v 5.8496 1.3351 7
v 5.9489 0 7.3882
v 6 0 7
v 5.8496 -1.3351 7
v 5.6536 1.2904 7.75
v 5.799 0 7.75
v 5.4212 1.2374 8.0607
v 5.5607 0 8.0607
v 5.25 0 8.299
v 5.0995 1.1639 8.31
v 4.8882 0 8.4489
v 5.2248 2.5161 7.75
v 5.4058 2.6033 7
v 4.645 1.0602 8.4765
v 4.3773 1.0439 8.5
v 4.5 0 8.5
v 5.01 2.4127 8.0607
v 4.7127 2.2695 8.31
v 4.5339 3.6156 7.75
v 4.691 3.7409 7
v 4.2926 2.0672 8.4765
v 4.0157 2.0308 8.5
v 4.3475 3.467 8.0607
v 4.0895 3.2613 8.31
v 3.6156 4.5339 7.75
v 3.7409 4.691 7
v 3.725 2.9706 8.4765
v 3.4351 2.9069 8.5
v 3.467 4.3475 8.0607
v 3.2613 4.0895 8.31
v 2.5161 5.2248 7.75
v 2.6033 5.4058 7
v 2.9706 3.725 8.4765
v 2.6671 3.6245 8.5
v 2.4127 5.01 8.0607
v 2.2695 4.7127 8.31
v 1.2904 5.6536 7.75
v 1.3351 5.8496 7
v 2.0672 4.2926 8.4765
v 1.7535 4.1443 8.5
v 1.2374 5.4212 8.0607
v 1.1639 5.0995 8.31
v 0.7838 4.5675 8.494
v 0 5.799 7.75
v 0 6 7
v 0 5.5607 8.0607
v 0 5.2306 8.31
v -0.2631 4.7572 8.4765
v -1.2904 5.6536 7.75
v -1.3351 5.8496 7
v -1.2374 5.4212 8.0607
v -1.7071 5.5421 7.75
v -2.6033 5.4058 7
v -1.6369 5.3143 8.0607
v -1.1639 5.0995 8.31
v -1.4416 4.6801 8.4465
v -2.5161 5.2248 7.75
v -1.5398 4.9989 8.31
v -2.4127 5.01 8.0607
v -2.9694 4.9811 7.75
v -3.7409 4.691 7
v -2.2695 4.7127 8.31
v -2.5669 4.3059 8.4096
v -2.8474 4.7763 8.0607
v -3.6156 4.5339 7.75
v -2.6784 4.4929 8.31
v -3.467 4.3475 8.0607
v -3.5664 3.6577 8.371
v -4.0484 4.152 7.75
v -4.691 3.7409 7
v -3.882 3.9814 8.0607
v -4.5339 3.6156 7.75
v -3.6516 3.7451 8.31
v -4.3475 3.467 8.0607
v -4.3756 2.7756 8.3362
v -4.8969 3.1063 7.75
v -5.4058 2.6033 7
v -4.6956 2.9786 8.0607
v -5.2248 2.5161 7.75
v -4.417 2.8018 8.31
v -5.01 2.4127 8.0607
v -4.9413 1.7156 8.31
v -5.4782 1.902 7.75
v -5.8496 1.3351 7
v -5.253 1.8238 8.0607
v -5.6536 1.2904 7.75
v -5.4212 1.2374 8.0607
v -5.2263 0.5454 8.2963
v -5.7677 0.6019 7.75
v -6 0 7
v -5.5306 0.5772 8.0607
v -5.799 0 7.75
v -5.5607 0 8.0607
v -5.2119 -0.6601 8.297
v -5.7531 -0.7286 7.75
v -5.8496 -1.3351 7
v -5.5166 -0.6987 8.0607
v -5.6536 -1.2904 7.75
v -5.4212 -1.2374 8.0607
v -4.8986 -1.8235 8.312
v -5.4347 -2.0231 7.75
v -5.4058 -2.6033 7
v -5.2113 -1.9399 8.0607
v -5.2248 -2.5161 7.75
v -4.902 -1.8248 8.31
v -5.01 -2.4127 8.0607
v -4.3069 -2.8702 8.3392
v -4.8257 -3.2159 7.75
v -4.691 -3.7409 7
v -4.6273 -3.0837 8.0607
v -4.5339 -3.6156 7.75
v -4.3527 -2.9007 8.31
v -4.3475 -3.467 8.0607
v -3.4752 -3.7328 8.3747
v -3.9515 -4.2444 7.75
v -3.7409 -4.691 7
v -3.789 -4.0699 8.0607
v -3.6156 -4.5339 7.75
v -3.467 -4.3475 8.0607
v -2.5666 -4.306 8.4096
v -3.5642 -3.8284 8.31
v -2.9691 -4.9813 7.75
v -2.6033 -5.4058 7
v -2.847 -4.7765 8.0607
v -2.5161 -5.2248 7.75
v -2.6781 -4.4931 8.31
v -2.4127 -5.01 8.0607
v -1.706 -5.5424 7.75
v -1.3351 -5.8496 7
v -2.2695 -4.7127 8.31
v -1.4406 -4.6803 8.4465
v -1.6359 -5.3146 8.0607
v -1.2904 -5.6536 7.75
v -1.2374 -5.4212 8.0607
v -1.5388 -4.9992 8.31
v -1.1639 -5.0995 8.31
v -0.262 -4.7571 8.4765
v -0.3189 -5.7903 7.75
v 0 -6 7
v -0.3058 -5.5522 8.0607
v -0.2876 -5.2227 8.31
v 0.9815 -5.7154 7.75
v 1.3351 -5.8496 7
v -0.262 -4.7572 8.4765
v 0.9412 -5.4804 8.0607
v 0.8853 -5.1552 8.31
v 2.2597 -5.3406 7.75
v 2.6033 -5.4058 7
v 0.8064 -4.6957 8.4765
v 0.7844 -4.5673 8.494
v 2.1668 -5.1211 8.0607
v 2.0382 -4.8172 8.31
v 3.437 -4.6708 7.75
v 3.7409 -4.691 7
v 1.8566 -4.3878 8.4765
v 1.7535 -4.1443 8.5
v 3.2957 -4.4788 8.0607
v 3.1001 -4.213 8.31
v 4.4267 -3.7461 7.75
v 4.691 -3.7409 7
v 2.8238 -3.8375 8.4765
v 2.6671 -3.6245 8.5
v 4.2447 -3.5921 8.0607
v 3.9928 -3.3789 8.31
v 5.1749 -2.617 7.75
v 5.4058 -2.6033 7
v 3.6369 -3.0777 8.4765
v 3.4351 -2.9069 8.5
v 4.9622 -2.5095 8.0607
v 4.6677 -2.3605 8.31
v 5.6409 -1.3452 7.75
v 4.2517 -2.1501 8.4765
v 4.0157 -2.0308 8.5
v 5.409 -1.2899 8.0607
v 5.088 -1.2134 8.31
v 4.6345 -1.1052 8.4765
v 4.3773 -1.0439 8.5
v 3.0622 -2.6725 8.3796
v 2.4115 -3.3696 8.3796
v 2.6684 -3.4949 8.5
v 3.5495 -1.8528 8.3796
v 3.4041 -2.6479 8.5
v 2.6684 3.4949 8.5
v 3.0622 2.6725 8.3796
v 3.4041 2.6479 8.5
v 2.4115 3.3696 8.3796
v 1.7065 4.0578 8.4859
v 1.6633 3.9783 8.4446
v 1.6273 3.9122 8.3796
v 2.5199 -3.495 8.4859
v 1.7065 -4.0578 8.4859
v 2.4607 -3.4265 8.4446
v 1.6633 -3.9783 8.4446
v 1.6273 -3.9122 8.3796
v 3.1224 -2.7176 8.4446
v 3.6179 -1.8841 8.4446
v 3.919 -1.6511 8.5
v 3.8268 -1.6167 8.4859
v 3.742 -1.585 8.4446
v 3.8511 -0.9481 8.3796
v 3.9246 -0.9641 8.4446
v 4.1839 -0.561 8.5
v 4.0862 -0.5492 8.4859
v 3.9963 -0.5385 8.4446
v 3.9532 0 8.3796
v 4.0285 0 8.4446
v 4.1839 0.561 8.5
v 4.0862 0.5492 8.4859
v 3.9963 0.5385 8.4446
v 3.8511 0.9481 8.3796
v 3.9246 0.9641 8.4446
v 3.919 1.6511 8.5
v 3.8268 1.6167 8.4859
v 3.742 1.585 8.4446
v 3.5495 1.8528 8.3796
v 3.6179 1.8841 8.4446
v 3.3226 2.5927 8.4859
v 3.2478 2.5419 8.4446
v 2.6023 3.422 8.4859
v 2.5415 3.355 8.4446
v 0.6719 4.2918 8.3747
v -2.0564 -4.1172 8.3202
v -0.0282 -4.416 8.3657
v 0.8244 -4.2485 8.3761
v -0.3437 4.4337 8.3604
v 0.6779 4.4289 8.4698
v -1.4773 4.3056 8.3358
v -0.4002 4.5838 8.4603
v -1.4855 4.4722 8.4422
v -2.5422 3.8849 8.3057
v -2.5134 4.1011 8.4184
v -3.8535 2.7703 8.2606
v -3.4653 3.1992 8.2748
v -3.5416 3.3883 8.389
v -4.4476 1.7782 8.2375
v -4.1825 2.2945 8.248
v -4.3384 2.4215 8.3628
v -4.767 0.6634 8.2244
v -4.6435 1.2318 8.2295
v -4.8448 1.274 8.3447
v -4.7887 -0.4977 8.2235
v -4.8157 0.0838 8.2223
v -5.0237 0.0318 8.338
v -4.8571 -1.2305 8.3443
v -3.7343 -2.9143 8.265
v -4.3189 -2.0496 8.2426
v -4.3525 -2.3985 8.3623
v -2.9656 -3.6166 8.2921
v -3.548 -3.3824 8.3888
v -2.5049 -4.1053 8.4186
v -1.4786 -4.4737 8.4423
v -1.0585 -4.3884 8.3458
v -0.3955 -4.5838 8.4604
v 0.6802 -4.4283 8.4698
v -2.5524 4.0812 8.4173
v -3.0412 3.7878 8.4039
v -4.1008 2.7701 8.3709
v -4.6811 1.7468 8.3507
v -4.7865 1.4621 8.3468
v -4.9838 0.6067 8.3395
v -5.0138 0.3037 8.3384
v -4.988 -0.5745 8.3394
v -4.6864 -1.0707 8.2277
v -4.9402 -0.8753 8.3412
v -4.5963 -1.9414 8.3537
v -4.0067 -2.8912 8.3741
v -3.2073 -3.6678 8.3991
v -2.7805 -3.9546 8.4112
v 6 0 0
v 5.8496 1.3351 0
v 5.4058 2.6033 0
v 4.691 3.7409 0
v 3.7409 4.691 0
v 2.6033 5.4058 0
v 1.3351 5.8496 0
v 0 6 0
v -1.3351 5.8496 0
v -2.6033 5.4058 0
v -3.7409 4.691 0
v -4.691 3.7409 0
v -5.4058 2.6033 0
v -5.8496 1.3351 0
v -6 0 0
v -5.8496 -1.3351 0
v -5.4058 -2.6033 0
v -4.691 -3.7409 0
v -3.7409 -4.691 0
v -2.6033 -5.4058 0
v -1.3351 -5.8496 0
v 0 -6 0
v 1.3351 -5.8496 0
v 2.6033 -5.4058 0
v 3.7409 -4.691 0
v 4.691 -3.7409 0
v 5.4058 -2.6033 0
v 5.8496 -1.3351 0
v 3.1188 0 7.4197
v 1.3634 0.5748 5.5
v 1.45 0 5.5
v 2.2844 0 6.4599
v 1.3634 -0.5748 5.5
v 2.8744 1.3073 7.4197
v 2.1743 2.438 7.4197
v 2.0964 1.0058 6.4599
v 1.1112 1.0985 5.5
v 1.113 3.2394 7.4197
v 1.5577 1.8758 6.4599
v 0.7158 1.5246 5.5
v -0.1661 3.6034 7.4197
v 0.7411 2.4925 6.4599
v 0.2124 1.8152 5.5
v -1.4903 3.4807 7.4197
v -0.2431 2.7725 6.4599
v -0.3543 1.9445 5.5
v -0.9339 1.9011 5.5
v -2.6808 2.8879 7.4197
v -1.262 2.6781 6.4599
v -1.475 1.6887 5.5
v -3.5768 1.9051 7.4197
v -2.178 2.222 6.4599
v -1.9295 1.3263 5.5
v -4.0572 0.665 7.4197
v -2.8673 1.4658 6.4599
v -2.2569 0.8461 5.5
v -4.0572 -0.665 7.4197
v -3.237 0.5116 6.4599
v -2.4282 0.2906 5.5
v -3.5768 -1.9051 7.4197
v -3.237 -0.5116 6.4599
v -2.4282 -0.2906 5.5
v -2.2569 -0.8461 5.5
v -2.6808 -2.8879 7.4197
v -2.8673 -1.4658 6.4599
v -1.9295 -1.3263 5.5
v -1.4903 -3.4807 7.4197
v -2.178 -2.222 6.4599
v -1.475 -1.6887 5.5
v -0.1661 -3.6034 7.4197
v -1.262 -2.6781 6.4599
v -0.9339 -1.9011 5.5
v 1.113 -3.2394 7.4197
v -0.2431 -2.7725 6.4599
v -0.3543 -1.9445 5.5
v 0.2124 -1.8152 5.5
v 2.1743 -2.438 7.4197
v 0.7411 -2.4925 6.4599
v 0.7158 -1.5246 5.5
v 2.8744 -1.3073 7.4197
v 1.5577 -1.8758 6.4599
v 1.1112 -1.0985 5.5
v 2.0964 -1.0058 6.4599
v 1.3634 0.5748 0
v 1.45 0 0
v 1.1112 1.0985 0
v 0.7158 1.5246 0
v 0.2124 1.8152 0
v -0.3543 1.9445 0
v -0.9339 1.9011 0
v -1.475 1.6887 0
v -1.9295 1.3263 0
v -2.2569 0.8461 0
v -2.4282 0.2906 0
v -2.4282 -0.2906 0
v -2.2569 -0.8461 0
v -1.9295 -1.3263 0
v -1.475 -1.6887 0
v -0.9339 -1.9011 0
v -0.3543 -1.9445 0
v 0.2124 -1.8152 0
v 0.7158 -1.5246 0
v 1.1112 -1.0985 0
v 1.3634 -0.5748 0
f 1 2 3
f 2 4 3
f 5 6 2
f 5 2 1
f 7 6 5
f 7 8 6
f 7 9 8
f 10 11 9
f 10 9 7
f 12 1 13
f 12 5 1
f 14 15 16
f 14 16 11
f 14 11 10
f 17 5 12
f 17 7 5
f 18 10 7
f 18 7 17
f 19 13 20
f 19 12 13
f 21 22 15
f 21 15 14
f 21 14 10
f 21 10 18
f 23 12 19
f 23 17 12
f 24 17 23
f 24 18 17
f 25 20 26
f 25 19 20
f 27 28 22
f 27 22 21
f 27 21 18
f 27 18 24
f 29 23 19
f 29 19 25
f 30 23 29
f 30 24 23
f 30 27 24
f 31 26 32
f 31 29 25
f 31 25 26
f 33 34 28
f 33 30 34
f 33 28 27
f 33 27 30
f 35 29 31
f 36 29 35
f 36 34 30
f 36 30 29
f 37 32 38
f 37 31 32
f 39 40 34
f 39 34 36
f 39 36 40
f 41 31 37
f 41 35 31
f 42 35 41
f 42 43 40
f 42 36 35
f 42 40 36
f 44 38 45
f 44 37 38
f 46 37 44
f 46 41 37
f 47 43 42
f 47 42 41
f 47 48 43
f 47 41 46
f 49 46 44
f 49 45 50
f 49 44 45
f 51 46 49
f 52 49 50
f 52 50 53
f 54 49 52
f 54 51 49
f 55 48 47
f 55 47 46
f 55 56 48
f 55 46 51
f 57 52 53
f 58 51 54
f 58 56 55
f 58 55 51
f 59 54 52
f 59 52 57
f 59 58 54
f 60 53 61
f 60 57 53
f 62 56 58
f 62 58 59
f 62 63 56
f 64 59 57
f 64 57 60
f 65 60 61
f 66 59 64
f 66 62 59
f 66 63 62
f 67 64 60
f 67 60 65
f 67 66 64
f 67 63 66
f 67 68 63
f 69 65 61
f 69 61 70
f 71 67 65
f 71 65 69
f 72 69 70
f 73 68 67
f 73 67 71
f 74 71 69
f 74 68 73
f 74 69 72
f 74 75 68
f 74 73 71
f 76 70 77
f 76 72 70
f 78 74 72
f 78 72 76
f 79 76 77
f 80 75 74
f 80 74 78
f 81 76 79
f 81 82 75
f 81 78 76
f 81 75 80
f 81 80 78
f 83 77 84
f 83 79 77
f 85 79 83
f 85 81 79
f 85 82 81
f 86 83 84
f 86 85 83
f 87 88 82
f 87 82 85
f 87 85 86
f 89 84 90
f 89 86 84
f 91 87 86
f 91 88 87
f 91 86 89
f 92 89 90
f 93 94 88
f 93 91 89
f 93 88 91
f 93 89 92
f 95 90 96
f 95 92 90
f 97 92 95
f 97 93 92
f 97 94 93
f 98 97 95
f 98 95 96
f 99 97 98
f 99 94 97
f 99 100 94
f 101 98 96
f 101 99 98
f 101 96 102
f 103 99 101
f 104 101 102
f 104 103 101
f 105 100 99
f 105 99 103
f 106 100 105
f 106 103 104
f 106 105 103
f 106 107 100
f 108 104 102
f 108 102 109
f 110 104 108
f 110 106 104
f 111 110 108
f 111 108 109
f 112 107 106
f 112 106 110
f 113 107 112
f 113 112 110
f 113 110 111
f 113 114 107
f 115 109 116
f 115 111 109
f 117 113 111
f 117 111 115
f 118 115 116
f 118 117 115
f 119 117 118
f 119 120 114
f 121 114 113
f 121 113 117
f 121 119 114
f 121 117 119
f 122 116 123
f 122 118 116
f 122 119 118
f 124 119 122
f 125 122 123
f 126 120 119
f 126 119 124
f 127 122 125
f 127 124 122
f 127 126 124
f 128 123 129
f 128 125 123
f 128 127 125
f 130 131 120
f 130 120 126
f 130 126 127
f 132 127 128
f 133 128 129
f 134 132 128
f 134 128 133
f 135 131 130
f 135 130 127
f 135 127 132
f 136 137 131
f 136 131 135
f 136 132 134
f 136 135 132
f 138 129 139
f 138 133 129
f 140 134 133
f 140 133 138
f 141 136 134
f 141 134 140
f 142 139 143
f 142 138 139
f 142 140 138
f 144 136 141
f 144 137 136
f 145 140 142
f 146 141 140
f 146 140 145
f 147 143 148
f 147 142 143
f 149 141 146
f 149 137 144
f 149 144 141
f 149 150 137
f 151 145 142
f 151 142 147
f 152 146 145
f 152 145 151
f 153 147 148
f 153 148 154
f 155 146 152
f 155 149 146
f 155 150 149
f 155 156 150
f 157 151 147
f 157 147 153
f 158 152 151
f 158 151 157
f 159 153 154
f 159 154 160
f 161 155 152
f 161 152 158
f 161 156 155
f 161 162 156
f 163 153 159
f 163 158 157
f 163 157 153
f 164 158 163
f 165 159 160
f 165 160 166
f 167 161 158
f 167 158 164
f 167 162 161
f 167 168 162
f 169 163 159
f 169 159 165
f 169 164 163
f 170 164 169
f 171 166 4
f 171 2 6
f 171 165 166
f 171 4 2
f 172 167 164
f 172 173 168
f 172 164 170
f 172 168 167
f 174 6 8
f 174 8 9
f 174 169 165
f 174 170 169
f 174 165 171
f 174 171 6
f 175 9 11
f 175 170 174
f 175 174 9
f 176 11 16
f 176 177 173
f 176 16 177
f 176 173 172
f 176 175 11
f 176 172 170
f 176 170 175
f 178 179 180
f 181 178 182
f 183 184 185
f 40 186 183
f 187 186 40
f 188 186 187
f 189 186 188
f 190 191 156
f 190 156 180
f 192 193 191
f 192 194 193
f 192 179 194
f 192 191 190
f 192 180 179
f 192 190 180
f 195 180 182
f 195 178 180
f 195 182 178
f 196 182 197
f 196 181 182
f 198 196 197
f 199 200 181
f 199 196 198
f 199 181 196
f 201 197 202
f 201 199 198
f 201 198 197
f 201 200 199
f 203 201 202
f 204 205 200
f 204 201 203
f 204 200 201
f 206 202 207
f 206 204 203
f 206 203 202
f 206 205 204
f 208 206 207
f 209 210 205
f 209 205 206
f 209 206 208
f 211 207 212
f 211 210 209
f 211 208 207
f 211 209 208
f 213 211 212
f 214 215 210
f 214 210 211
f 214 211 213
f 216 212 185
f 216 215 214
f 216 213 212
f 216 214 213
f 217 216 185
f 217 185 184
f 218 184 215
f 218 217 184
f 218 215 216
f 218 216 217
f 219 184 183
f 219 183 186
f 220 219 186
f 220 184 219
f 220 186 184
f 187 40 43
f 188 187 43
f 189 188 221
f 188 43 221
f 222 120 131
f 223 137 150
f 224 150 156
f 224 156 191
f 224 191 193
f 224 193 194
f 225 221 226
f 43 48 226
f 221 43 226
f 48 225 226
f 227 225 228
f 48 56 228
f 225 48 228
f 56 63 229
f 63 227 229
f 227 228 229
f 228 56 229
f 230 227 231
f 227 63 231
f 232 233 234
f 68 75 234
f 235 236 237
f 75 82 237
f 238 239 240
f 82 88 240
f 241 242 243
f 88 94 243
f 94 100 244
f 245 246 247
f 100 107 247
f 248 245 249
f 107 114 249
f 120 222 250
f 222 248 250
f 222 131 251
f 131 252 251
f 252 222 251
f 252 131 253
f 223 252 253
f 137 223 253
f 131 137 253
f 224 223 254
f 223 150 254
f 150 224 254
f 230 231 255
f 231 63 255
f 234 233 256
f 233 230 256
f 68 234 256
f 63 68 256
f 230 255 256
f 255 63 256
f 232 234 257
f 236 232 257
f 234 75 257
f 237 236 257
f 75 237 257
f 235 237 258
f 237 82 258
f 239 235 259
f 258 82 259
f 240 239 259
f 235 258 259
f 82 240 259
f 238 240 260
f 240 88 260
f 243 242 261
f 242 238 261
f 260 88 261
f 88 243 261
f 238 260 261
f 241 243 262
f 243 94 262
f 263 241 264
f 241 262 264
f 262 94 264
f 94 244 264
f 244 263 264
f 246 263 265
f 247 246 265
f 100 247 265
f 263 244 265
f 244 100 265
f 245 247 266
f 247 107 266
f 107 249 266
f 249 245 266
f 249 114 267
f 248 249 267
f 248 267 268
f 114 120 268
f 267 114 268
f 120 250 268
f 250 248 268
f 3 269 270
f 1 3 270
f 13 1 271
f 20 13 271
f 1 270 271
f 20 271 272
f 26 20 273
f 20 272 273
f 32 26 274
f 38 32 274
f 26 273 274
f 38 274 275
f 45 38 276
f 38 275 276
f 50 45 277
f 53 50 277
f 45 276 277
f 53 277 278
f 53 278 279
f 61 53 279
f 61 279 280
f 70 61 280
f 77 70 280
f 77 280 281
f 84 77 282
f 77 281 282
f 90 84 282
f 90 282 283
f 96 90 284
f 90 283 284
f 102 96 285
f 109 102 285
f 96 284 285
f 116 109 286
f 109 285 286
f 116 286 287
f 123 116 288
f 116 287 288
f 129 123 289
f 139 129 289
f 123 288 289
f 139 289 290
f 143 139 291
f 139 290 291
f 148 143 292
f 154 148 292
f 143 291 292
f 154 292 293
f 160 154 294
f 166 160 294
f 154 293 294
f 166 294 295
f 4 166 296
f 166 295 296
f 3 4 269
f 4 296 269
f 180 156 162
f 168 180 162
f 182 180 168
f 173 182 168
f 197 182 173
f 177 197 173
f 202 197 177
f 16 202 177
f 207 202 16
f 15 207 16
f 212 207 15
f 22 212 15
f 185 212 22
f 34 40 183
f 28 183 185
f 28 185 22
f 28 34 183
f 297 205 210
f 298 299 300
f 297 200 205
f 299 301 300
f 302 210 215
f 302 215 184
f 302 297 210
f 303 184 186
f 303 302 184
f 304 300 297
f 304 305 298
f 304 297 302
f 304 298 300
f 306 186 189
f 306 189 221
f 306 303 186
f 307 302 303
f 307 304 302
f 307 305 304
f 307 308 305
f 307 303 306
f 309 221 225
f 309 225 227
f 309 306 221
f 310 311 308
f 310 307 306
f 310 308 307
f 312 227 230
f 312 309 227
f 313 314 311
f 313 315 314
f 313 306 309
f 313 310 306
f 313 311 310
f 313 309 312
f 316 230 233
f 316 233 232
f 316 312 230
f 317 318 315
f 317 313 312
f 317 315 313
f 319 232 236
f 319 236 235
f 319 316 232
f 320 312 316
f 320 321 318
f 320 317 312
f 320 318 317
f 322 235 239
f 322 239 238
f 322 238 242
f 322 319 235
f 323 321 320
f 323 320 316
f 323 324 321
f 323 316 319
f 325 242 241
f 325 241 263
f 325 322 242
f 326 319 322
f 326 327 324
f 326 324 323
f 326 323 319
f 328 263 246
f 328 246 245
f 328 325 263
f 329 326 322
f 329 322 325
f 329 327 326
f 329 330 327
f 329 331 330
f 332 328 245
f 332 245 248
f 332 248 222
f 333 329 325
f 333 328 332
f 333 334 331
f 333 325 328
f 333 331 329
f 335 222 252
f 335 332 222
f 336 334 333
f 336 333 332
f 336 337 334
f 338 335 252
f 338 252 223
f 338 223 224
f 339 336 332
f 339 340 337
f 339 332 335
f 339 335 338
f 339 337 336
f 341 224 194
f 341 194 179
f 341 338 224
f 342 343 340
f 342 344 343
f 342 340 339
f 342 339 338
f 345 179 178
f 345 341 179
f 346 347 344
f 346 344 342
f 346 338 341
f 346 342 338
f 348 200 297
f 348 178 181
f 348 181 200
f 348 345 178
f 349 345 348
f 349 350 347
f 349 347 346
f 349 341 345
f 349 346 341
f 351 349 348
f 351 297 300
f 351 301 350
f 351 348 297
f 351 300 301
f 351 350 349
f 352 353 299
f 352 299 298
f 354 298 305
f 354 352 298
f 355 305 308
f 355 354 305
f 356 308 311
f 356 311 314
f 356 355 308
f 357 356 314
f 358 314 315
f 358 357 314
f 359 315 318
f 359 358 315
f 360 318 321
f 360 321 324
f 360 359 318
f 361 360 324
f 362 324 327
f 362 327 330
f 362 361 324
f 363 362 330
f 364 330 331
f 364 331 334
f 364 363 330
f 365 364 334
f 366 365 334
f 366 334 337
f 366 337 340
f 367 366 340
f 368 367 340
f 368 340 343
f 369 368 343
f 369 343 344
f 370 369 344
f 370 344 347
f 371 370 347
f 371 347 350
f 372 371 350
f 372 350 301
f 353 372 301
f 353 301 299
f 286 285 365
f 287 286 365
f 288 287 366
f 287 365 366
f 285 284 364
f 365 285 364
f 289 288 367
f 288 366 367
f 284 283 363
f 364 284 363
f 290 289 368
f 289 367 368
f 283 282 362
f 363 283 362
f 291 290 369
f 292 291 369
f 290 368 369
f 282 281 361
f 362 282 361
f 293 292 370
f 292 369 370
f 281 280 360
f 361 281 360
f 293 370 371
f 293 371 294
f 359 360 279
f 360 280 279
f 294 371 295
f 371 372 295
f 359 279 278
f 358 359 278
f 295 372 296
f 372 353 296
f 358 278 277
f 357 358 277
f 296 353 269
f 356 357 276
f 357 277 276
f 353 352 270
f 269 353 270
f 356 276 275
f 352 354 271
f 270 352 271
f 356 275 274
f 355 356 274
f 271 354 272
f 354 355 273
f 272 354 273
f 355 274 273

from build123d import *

# Parameters (mm, degrees)
F0_R     = 6
F0_R_2   = 1.95
F1_DEPTH = 8.5
F2_R     = 1.5
F4_R     = 0.35


# Not quite as in the source:
# - a fillet or chamfer that OpenCascade refuses, or shapes differently, is made with other operations: its cross-section is extruded or revolved along the edge and cut away or added


with BuildPart() as f1:
    # F0 (on Top) → F1 (new body)
    with BuildSketch(Plane.XY):
        Circle(F0_R)
        with Locations((-0.5, 0)):
            Circle(F0_R_2, mode=Mode.SUBTRACT)
    extrude(amount=F1_DEPTH)

    # F2
    f2_edges = [f1.edges().sort_by_distance(p)[0] for p in [
        (-6, 0, 8.5),
    ]]
    fillet(f2_edges, radius=F2_R)

    # F3: chamfer of 3 x 2.6078602134 on 1 edges, made by hand

    # F3_s1 → F3_t2 (revolve, cut)
    with BuildSketch(Plane.XZ):
        Polygon((4.0578602134, 8.5), (1.45, 5.5), (1.45, 8.5), align=None)
    revolve(axis=Axis((-0.5, 0, 8.5), (0, 0, 1)), mode=Mode.SUBTRACT)

    # F4
    f4_edges = [f1.edges().sort_by_distance(p)[0] for p in [
        (2.985849, -2.936486, 8.5),
        (2.985849, 2.936486, 8.5),
        (-4.987173, -4e-06, 8.418683),
    ]]
    fillet(f4_edges, radius=F4_R)


solid = f1.part
